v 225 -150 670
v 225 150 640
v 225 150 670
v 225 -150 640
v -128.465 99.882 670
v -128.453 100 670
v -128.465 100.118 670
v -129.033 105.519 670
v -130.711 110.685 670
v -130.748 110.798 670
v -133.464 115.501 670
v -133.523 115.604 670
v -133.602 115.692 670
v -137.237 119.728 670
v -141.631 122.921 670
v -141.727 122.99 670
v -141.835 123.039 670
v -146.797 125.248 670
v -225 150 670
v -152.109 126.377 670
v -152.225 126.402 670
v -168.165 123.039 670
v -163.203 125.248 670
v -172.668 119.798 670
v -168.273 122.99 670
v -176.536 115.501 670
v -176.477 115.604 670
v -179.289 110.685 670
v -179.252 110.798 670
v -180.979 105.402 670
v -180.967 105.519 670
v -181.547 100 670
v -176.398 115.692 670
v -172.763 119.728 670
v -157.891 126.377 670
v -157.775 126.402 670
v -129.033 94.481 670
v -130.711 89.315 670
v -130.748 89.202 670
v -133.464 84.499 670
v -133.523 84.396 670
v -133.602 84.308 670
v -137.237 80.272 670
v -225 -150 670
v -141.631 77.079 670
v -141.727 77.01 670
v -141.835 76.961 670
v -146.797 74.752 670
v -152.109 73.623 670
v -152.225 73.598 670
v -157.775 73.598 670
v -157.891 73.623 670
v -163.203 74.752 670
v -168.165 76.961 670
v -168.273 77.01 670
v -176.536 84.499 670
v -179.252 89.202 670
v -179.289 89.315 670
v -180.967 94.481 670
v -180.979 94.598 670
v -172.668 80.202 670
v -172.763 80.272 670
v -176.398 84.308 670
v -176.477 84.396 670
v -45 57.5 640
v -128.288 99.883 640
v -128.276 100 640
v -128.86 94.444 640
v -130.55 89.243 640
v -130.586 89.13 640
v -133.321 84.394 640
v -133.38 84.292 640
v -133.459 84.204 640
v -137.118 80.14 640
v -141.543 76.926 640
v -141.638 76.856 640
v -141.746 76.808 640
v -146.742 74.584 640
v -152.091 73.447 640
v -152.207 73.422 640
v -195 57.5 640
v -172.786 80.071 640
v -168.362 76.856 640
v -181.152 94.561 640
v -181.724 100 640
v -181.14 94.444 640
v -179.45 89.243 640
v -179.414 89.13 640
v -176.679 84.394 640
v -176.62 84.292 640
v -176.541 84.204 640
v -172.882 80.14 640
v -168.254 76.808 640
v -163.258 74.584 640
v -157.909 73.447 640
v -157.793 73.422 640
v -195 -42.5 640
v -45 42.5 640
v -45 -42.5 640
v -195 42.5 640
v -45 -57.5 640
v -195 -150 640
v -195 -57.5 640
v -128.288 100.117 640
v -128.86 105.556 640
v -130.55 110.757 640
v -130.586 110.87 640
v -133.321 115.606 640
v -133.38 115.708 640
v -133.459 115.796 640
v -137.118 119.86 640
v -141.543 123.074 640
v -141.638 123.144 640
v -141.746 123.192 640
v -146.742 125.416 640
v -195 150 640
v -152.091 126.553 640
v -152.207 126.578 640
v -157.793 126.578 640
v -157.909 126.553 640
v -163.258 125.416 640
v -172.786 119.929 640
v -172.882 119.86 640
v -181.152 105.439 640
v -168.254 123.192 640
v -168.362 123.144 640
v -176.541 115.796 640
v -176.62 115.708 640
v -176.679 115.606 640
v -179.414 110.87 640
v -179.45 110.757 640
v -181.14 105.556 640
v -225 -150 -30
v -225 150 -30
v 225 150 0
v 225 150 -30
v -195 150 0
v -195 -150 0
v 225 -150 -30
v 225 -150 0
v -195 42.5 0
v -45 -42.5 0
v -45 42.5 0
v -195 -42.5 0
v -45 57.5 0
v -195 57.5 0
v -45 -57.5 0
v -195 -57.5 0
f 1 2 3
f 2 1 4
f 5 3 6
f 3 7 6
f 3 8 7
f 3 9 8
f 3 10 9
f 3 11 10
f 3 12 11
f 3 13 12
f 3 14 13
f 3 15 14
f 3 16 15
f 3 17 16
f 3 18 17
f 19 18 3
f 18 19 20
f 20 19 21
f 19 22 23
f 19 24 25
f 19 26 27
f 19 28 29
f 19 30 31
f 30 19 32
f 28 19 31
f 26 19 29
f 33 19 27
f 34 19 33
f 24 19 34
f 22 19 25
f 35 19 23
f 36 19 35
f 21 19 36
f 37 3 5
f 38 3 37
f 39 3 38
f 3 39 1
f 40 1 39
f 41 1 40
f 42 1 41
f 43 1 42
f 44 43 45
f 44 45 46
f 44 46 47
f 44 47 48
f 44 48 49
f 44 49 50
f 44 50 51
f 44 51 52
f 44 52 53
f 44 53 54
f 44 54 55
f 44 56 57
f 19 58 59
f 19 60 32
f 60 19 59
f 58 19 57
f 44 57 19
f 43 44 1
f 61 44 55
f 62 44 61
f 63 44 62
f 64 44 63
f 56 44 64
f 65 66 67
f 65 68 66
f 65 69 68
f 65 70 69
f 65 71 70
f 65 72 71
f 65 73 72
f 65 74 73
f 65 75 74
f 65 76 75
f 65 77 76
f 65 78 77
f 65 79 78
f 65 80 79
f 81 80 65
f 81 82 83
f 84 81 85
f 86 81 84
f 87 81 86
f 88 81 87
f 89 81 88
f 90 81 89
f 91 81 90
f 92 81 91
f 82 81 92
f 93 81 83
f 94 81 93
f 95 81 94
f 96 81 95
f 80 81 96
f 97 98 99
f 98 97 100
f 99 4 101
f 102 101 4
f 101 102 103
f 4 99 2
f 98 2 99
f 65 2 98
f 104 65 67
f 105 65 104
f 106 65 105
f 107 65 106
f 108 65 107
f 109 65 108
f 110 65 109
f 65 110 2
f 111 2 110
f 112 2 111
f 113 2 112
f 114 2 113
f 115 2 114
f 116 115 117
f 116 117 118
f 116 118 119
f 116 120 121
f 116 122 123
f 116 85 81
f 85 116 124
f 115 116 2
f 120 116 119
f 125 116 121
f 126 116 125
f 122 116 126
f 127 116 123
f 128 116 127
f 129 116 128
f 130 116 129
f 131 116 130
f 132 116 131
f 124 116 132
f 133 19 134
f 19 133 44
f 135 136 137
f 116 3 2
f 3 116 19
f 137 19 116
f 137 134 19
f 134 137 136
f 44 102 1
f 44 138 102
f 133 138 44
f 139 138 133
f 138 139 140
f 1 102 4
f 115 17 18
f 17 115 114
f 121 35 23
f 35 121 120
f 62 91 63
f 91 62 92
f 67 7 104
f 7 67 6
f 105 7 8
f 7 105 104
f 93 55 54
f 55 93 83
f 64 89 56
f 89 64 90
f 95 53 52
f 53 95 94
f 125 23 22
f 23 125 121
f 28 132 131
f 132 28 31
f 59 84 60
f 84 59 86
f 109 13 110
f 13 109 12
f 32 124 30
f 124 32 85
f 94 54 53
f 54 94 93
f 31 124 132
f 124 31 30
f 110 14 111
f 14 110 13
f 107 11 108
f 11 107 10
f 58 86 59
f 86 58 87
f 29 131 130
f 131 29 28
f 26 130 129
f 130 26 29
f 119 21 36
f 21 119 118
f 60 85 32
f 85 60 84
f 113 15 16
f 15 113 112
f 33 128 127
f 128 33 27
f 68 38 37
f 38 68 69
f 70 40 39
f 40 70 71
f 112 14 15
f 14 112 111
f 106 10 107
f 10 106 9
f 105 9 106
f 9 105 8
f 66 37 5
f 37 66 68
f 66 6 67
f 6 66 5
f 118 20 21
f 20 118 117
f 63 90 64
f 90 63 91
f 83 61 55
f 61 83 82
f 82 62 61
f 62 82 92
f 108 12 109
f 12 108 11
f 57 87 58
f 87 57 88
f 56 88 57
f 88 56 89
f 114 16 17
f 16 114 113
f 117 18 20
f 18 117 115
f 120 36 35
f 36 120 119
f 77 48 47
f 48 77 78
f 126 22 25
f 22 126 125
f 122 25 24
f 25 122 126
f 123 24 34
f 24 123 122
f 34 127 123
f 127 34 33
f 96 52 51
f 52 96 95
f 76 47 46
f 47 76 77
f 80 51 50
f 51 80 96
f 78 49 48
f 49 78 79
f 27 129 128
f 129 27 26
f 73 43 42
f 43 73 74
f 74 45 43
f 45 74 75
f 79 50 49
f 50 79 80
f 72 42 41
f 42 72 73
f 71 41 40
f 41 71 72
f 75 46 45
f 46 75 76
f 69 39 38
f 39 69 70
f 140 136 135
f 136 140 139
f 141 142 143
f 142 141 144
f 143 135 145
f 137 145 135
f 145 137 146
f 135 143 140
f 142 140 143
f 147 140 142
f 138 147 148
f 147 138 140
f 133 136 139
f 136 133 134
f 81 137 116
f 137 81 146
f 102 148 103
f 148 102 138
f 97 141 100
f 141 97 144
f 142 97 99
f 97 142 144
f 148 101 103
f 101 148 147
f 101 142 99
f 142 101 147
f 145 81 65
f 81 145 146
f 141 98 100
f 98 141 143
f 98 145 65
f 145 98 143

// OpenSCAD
v_height = 640;
h_width = 450;

module h_board(width=h_width, height=30, depth=300) {
  cube([width, depth, height], true);
}

module v_board(width=v_height, height=30, depth=300) {
  translate([30/2, 0, v_height/2]) rotate([0, -90, 0]) cube([width, depth, height], true);
}

translate([0, 0, -30/2]) h_board();
difference() {
  translate([0, 0, v_height + 30/2]) h_board();
  translate([-h_width/2 + 60/2 + 30 + 10, 100]) cylinder(10000, 60, center=true);
}
color([255, 0, 0]) translate([-h_width/2, 0, 0]) v_board();
translate([-h_width/2 + 150/2 + 30, -50, v_height/2]) rotate([-90, -90, 0]) cube([v_height, 150, 15], true);
translate([-h_width/2 + 150/2 + 30, 50, v_height/2]) rotate([-90, -90, 0]) cube([v_height, 150, 15], true);
